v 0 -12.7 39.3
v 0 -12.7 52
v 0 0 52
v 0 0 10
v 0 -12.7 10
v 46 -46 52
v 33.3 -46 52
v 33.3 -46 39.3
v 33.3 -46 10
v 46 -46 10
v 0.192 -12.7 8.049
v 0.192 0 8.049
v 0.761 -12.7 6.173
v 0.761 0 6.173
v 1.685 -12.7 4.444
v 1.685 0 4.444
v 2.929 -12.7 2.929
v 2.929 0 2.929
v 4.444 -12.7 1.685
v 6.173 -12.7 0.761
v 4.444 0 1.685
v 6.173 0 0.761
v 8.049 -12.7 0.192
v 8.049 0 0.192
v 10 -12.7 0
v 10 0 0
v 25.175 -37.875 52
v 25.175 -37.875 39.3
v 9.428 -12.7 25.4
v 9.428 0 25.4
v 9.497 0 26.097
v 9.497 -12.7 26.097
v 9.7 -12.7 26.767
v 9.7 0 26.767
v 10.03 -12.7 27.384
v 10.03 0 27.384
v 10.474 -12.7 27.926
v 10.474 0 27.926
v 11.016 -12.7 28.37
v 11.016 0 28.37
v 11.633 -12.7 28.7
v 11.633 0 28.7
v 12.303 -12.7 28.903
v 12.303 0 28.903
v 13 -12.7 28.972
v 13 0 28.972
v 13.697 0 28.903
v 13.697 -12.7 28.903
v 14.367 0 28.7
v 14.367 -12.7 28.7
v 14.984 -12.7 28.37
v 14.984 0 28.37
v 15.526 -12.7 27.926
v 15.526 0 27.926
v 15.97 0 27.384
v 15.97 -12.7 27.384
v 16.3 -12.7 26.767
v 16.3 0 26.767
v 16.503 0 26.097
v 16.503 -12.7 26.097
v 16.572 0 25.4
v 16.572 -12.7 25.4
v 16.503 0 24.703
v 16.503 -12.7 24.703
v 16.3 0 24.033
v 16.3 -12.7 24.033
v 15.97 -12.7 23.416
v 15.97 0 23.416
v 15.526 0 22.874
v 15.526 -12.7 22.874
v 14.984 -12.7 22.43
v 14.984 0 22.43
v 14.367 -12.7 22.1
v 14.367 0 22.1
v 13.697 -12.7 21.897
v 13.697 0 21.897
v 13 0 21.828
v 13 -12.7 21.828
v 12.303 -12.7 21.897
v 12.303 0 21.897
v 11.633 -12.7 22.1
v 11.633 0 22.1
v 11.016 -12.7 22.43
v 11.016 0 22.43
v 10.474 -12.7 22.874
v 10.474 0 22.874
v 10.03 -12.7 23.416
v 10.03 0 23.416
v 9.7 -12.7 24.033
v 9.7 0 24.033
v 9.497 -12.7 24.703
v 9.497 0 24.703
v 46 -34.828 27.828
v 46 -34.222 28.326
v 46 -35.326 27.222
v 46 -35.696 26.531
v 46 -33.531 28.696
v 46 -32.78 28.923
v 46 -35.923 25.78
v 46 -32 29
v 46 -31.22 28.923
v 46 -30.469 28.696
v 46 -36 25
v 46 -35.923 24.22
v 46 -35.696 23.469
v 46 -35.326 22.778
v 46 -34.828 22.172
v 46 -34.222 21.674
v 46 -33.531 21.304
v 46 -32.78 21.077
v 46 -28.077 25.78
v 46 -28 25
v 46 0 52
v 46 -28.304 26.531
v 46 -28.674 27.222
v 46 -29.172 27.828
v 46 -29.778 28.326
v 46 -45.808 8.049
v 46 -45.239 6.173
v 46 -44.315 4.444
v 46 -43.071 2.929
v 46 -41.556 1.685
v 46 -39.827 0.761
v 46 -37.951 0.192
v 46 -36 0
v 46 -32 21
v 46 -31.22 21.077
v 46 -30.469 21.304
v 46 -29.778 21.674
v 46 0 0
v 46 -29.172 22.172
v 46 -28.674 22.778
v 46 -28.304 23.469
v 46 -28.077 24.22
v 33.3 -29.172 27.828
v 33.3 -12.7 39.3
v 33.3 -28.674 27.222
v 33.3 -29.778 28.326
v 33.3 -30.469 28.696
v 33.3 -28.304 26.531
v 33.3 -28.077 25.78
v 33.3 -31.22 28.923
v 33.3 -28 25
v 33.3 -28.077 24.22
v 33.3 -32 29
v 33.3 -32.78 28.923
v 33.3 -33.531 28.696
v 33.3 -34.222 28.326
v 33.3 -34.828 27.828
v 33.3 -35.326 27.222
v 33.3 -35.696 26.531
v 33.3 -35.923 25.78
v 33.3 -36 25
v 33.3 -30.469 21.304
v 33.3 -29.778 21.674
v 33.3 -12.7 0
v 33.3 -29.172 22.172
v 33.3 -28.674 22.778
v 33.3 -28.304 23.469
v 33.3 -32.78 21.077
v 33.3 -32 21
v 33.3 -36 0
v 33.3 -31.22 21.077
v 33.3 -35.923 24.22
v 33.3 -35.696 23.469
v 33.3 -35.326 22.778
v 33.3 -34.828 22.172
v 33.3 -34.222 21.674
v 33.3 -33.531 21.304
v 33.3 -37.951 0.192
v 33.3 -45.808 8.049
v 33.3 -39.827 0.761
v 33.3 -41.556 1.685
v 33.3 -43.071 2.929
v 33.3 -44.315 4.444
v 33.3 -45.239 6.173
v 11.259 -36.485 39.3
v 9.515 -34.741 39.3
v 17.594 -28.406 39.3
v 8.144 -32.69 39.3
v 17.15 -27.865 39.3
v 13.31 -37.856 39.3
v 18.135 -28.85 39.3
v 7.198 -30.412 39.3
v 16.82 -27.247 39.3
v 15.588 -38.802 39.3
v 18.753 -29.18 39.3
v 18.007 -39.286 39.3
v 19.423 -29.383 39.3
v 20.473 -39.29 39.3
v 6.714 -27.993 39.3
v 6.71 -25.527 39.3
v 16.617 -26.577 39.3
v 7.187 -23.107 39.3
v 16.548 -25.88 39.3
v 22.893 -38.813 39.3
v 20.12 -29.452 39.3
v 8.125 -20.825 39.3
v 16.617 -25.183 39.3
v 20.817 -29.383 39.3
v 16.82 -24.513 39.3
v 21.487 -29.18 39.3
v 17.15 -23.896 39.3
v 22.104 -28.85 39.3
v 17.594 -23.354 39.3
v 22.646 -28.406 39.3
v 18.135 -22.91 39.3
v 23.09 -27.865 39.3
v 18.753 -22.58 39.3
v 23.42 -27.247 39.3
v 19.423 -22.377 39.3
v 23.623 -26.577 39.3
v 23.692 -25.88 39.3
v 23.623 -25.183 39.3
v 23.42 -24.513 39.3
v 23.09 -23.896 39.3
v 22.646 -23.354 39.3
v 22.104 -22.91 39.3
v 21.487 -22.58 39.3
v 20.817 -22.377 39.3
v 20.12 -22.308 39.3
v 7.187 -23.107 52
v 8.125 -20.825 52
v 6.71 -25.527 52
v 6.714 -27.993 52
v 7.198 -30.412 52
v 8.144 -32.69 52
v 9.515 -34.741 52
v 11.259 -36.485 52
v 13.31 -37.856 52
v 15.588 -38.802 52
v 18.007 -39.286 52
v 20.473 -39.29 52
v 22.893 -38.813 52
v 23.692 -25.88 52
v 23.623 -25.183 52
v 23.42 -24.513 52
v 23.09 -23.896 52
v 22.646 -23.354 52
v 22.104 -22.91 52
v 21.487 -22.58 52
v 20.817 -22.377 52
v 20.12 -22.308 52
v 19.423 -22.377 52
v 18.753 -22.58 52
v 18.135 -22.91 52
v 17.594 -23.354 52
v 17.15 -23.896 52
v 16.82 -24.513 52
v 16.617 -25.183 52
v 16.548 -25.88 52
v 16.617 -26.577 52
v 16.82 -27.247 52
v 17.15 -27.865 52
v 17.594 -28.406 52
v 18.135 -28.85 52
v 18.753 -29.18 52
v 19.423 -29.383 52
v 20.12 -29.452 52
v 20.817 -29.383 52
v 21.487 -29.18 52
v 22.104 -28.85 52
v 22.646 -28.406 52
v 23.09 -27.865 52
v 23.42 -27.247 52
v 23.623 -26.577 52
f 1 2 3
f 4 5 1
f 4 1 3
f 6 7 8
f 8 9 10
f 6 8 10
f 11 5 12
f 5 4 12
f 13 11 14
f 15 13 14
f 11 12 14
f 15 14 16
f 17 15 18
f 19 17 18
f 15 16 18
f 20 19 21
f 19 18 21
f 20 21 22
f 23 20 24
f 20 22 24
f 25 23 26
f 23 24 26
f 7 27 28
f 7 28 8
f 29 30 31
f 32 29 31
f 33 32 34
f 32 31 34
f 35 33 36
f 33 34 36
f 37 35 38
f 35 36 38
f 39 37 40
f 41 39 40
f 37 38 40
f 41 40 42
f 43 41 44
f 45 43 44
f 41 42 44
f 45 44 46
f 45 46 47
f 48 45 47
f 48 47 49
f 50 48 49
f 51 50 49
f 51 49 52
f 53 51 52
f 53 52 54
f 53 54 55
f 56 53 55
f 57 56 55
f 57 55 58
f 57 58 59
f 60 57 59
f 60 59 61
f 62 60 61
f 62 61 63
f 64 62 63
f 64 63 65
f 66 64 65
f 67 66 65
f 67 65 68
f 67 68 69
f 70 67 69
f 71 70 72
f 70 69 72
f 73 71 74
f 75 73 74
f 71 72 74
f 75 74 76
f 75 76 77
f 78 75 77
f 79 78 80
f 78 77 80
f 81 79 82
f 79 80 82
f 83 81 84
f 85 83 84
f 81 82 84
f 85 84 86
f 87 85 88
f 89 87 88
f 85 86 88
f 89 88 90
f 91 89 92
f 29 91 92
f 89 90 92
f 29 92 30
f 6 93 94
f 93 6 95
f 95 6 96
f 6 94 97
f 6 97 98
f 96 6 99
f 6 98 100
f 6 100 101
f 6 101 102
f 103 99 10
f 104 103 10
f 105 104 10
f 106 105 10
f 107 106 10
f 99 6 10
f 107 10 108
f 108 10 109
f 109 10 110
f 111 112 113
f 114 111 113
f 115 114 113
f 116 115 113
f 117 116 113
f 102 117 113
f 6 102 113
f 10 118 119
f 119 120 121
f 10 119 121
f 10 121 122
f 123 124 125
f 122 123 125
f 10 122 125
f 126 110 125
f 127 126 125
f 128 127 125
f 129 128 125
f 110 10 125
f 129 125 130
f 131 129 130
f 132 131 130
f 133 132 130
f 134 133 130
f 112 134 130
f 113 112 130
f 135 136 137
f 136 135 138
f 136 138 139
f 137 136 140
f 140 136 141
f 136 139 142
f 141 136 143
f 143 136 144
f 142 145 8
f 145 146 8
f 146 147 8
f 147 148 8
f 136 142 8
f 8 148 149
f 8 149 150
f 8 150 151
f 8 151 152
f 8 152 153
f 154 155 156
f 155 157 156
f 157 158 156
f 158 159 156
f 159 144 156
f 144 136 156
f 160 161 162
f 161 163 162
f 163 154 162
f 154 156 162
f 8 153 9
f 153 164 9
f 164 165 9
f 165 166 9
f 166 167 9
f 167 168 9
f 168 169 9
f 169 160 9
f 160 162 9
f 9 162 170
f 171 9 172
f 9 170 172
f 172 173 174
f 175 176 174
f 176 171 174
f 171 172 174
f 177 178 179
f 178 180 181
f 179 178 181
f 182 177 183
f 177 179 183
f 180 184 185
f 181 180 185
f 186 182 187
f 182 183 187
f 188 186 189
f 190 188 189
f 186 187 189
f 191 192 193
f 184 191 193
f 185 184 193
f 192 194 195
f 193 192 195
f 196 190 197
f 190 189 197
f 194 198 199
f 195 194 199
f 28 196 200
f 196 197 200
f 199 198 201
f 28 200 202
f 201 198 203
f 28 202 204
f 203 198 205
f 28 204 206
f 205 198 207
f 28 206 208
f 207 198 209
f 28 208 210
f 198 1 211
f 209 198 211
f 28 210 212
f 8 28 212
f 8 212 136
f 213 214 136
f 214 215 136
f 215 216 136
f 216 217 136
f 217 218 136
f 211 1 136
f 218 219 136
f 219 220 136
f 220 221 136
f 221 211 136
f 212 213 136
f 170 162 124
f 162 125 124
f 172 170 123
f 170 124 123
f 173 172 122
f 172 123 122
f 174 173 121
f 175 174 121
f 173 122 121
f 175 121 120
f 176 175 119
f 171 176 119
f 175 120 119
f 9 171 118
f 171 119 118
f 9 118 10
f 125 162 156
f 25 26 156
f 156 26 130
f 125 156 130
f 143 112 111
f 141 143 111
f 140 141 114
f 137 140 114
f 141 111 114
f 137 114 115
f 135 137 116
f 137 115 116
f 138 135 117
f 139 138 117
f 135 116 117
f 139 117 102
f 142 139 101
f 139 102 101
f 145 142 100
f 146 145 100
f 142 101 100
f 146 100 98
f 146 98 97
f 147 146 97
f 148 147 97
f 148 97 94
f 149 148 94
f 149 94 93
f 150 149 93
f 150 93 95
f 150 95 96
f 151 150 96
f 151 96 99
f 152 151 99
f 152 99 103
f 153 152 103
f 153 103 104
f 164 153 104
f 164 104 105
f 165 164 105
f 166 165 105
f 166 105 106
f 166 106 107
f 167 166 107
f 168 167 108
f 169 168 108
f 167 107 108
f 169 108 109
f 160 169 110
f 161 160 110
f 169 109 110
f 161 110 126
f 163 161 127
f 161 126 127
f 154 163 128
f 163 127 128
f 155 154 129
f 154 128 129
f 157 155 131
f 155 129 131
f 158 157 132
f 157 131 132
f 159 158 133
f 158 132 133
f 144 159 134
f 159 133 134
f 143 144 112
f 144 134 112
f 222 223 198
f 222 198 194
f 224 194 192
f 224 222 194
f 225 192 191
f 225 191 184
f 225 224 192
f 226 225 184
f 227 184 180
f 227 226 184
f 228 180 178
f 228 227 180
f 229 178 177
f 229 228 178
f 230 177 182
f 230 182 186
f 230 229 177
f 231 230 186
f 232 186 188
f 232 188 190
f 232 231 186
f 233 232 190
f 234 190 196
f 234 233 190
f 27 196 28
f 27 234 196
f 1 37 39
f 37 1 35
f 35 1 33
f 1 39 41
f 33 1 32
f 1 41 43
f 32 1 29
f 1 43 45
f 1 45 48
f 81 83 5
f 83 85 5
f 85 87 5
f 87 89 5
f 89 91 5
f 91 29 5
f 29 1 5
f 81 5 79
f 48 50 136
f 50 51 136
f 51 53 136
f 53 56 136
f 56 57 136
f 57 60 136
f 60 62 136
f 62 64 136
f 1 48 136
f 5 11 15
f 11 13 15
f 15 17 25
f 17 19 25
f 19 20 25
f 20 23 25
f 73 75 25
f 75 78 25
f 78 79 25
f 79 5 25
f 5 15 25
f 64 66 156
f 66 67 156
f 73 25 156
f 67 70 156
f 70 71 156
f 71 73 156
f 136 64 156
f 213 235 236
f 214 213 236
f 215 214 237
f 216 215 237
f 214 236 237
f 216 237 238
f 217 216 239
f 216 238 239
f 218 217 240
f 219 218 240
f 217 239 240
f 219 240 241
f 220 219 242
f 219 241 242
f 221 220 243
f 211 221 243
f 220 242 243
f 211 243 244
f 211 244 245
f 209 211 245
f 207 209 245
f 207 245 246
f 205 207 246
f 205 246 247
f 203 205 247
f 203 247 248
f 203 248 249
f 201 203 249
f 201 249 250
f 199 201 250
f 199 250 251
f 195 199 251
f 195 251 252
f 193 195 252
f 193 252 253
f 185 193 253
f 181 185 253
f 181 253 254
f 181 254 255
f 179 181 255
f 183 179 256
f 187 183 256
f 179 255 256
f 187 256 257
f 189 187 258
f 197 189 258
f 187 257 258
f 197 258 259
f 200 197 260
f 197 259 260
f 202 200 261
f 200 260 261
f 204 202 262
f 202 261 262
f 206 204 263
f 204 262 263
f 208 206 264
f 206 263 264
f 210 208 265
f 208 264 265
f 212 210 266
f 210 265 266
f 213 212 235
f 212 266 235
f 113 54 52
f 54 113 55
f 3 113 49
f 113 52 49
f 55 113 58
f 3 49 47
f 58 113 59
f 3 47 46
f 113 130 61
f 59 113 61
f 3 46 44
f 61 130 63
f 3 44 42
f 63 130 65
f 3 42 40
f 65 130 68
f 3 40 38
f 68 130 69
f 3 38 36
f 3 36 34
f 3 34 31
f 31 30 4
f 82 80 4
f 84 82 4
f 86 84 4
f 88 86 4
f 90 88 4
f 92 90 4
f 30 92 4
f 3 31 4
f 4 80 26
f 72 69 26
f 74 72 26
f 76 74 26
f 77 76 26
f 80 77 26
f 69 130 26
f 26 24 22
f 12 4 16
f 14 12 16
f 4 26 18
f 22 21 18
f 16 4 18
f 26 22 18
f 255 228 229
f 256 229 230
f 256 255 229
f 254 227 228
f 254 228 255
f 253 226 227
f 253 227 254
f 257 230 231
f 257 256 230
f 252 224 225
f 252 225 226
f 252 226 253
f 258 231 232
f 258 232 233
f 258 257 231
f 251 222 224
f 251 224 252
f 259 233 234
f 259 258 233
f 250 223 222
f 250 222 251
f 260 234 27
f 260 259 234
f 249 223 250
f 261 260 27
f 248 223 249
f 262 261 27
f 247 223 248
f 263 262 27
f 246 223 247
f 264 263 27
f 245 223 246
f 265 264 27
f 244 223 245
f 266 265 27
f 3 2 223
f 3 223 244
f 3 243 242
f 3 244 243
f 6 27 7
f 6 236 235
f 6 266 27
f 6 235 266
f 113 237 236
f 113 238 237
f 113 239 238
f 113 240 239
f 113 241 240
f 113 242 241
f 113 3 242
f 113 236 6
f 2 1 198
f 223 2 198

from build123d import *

# Parameters (mm, degrees)
F0_W     = 33.3
F0_H     = 12.7
F1_DEPTH = 52
F3_DEPTH = 12.7
F4_R     = 4
F5_DEPTH = 46.001
F6_R     = 3.571875
F7_DEPTH = 25
F8_R     = 3.571875
F9_DEPTH = 25
F10_R    = 10


with BuildPart() as f1:
    # F0 (on Top) → F1 (new body)
    with BuildSketch(Plane.XY):
        with Locations((16.65, -6.35)):
            Rectangle(F0_W, F0_H)
        Polygon((46, 0), (33.3, 0), (33.3, -12.7), (33.3, -46), (46, -46), align=None)
    extrude(amount=F1_DEPTH)

    # F2 (on face) → F3 (join)
    with BuildSketch(Plane.XY.offset(52)):
        Polygon((46, -46), (46, 0), (0, 0), (0, -12.7), (8.125442, -20.825442), (25.174558, -37.874558), (33.3, -46), align=None)
        with BuildLine():
            Line((25.174558, -37.874558), (8.125442, -20.825442))
            ThreePointArc((8.125442, -20.825442), (10.344245, -35.655755), (25.174558, -37.874558))
        make_face()
    extrude(amount=-F3_DEPTH)

    # F4 (on face) → F5 (cut, through all)
    with BuildSketch(Plane.YZ.offset(46)):
        with Locations((-32, 25)):
            Circle(F4_R)
    extrude(amount=-F5_DEPTH, mode=Mode.SUBTRACT)

    # F6 (on face) → F7 (cut)
    with BuildSketch(Plane(origin=(0, 0, 0), x_dir=(-1, 0, 0), z_dir=(0, 1, 0))):
        with Locations((-13, 25.4)):
            Circle(F6_R)
    extrude(amount=-F7_DEPTH, mode=Mode.SUBTRACT)

    # F8 (on face) → F9 (cut)
    with BuildSketch(Plane.XY.offset(52)):
        with Locations((20.119892, -25.880108)):
            Circle(F8_R)
    extrude(amount=-F9_DEPTH, mode=Mode.SUBTRACT)

    # F10
    f10_edges = [f1.edges().sort_by_distance(p)[0] for p in [
        (39.65, -46, 0),
        (0, -6.35, 0),
    ]]
    fillet(f10_edges, radius=F10_R)


solid = f1.part
